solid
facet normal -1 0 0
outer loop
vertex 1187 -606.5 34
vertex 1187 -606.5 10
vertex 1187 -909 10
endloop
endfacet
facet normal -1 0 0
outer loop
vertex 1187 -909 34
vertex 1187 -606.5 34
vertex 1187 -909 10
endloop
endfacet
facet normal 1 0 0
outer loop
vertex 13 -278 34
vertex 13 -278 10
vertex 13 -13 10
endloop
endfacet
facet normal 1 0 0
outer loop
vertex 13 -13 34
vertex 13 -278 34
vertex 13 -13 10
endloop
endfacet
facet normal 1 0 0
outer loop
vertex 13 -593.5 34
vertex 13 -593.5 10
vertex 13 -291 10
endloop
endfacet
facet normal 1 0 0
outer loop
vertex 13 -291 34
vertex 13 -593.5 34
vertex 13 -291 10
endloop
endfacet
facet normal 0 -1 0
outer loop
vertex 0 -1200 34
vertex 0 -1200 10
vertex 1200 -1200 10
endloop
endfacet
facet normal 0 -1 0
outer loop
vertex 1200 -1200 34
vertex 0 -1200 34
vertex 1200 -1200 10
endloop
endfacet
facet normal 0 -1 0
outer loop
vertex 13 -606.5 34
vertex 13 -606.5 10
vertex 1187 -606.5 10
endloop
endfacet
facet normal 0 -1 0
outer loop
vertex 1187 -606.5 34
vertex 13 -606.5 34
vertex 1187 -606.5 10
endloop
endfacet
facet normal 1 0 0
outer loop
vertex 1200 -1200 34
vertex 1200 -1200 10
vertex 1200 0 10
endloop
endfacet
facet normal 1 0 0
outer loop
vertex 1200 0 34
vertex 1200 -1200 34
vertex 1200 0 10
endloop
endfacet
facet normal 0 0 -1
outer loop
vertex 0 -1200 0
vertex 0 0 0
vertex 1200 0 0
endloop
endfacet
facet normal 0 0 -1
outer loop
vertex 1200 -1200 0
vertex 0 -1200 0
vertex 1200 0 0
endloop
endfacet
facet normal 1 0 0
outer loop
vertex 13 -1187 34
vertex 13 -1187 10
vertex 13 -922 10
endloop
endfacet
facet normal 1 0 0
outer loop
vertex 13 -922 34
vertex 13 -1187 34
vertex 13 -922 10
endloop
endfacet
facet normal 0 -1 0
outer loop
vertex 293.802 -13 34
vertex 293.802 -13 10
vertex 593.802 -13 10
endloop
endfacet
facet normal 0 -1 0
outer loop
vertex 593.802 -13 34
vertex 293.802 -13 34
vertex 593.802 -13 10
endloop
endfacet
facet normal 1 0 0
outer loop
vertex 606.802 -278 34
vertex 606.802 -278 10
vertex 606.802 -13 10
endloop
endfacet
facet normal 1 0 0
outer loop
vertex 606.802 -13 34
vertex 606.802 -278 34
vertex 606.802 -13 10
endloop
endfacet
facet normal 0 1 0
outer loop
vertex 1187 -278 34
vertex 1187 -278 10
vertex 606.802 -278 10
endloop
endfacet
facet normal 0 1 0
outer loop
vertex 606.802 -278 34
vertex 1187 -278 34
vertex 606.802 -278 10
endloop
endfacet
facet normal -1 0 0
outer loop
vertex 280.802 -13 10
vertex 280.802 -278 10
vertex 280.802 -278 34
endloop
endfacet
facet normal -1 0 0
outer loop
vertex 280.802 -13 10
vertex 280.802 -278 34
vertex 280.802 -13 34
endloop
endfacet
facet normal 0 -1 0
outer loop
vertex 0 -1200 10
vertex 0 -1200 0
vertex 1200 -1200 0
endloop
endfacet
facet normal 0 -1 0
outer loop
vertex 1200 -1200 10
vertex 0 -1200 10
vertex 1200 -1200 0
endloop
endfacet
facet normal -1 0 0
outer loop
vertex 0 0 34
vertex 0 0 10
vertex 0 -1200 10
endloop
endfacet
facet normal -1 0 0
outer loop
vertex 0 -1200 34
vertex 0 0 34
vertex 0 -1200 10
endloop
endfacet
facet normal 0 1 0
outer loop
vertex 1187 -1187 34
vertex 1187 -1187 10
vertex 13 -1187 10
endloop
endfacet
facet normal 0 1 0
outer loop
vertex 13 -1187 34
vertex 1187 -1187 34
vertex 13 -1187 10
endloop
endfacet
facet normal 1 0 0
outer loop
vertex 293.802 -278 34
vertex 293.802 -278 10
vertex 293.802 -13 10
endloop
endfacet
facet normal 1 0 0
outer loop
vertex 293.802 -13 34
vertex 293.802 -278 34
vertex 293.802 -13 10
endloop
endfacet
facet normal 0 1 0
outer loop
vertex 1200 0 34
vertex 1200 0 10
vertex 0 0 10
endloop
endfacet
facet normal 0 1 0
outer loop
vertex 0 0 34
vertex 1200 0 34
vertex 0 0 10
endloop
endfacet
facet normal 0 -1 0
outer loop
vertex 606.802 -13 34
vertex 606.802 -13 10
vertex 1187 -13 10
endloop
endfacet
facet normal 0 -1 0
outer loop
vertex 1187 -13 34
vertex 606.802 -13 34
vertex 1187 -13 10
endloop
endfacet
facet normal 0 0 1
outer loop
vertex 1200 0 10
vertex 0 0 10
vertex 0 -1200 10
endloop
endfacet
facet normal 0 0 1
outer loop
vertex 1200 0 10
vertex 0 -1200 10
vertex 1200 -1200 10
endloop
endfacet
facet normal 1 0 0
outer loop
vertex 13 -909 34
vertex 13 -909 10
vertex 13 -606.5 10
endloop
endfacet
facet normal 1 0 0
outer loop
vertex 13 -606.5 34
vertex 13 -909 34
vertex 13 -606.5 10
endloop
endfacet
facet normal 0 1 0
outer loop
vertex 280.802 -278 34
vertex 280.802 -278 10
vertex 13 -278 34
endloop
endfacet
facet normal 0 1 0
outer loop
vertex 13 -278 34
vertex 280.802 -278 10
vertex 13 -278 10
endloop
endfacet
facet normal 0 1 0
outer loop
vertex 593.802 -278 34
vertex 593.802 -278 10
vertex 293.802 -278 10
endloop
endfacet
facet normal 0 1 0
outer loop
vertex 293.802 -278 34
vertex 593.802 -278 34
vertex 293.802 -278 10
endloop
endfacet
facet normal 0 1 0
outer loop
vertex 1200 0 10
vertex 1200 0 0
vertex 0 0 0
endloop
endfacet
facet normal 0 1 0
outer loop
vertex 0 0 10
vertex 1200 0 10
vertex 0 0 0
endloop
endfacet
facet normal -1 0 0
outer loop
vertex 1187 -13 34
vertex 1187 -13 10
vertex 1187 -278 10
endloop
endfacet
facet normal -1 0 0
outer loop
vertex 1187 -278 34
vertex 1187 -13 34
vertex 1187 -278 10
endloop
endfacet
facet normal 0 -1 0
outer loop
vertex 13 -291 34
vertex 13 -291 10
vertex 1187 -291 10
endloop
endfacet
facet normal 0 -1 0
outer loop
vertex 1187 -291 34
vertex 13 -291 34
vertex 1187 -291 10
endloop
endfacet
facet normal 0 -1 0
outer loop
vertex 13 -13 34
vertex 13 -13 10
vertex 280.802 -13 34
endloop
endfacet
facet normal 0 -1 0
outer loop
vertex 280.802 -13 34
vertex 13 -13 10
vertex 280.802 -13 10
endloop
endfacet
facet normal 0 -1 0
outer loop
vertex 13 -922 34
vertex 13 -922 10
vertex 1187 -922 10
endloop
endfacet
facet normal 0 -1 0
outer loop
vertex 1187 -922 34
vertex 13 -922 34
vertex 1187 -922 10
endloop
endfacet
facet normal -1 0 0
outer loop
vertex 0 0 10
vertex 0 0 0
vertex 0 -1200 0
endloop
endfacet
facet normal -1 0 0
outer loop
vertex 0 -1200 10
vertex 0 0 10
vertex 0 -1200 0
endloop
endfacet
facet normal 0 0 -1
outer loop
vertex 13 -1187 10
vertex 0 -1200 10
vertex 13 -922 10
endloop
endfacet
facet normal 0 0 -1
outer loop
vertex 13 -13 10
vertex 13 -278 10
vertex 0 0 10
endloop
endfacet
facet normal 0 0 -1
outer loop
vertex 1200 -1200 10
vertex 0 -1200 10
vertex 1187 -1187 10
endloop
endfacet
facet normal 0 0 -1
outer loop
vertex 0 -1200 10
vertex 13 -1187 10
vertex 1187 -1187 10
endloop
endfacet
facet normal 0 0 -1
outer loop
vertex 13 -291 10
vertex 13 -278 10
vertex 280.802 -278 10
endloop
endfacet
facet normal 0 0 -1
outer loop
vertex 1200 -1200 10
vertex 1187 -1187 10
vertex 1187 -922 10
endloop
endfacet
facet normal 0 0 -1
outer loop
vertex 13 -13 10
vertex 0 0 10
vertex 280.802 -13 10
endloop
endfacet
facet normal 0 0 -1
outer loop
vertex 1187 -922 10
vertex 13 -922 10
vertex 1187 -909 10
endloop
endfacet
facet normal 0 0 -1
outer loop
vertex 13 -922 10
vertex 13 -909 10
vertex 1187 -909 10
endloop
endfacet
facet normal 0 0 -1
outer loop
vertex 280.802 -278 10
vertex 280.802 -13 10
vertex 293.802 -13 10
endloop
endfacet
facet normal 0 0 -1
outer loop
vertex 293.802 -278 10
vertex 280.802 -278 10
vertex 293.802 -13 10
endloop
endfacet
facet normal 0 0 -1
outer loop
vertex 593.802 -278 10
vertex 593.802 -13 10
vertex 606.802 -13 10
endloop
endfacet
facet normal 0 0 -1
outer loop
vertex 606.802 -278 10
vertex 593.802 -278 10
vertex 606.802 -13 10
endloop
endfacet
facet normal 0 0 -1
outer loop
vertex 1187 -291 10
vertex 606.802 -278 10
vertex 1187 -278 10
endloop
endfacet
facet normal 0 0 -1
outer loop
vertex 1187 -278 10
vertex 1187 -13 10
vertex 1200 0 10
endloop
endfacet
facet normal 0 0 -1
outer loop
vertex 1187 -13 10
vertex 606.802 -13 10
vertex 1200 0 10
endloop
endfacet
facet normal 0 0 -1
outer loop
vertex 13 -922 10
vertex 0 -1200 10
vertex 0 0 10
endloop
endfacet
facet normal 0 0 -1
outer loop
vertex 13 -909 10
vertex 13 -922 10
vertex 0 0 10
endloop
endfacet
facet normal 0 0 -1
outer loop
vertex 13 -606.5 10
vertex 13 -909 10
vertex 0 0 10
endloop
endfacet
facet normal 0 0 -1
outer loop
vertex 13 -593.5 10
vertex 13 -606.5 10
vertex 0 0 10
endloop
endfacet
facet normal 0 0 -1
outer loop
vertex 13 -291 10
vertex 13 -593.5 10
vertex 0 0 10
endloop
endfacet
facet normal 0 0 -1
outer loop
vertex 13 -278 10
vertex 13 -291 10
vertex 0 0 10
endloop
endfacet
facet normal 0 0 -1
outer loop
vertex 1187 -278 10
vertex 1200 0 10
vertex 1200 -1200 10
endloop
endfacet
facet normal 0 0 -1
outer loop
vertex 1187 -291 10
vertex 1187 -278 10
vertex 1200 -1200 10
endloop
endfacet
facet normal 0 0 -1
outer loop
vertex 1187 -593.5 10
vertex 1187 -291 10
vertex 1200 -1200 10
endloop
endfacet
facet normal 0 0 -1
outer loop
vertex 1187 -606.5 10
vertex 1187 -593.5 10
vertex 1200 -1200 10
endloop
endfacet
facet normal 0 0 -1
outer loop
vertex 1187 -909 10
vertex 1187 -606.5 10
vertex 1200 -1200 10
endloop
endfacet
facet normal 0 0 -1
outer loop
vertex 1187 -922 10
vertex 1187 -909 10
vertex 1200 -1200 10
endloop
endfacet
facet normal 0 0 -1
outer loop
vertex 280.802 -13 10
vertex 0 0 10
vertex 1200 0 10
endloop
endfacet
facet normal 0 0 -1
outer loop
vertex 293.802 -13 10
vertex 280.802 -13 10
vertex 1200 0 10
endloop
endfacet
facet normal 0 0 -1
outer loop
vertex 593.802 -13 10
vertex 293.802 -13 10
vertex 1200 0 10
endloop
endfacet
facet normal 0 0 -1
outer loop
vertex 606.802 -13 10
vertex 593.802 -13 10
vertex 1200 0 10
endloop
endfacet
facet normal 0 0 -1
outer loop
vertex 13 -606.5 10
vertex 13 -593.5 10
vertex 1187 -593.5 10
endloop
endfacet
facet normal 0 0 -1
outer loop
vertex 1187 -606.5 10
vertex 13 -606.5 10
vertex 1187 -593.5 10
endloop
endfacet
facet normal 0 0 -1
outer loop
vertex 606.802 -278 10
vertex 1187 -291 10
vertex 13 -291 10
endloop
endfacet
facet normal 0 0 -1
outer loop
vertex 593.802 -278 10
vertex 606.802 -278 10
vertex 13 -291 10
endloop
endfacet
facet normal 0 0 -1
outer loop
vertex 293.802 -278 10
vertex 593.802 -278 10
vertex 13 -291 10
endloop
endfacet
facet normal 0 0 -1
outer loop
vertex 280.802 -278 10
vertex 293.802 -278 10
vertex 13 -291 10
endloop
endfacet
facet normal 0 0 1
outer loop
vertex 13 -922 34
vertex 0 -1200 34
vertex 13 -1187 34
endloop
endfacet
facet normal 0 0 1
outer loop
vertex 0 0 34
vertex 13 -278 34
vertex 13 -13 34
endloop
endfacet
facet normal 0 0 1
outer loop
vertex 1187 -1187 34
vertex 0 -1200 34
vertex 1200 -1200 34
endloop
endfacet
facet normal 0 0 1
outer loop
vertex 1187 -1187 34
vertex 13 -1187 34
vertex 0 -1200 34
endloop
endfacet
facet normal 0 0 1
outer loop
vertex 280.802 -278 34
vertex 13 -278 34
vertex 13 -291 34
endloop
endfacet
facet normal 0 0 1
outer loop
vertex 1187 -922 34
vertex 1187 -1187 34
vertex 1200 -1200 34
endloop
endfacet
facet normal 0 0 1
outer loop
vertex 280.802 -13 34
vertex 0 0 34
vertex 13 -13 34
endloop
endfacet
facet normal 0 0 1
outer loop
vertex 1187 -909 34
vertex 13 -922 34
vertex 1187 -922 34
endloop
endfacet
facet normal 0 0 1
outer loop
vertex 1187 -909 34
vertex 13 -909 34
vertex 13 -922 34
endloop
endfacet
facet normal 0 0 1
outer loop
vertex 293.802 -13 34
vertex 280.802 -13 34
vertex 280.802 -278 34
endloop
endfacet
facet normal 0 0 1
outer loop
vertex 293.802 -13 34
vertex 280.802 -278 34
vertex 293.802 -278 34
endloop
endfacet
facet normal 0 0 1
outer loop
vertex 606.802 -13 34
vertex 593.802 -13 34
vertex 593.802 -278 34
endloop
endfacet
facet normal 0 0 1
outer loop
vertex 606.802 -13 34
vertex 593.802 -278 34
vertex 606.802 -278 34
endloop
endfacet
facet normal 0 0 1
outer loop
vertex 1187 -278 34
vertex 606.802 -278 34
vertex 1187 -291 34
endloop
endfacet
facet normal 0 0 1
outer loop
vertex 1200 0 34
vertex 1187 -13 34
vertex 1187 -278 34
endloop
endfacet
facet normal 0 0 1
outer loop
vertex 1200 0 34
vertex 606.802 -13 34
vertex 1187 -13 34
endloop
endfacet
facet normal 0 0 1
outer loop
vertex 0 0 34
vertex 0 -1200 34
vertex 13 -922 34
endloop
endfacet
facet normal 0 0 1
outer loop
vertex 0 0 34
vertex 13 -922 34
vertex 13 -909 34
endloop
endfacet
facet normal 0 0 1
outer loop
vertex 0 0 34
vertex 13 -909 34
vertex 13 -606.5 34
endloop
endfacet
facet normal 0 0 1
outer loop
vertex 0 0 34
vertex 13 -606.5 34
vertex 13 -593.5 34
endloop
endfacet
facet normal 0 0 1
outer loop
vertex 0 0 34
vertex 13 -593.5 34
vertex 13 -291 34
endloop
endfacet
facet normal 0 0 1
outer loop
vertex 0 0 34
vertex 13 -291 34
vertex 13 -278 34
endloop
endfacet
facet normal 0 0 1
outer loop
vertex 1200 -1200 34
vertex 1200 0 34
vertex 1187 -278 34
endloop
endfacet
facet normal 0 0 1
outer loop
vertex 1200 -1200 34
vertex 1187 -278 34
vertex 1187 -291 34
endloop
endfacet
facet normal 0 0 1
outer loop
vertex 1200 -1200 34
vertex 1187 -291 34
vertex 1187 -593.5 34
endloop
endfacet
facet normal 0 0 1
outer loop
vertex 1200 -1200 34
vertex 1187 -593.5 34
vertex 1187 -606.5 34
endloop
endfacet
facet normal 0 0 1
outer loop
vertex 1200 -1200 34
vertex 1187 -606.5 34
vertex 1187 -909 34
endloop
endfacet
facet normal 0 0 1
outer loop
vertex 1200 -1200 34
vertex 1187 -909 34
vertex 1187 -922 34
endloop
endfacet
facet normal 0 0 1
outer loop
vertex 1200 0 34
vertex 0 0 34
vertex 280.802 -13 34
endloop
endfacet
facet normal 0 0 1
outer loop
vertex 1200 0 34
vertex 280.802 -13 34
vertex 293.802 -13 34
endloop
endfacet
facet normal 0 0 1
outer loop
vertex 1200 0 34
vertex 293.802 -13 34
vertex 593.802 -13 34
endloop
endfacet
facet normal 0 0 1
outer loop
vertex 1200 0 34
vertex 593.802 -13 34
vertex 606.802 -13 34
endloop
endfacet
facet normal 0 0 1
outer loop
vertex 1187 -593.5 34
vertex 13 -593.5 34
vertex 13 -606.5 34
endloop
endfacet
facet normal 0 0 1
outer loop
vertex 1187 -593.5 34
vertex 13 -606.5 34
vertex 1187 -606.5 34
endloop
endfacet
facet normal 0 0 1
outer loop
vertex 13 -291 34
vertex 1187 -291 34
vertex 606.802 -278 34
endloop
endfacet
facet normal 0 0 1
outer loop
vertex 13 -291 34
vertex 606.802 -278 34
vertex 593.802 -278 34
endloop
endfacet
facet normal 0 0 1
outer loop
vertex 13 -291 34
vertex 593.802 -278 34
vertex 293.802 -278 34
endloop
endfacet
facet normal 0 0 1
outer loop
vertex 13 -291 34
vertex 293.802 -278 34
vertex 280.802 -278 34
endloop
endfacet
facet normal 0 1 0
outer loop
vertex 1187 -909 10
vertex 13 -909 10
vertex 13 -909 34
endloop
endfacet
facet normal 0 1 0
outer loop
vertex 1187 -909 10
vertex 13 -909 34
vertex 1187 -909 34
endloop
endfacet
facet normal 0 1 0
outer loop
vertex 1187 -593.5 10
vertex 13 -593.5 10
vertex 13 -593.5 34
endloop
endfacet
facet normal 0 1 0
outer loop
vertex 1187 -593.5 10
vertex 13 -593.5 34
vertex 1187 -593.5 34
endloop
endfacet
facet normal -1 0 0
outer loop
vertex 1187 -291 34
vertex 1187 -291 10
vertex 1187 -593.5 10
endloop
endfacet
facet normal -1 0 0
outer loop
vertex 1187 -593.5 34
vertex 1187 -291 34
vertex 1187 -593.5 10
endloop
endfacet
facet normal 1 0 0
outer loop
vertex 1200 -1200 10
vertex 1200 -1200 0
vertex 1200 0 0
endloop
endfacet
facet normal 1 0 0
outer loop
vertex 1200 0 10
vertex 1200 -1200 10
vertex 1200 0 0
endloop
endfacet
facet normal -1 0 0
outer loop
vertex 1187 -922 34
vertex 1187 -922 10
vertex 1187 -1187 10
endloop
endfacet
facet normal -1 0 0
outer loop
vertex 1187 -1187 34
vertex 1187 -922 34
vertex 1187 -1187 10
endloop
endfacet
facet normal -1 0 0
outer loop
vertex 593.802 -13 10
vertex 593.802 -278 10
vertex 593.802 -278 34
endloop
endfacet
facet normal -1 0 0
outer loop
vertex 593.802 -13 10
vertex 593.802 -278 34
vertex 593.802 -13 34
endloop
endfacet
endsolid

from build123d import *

# Parameters (mm, degrees)
F0_W     = 1174
F0_H     = 265
F0_H_2   = 302.5
F0_W_2   = 267.8023775816
F0_W_3   = 300
F0_W_4   = 580.1976224184
F0_W_5   = 13
F0_H_3   = 13
F1_DEPTH = 10
F2_START = 10
F2_DEPTH = 24


with BuildPart() as f1:
    # F0 (on Top) → F1 (new body)
    with BuildSketch(Plane.XY):
        Polygon((13, 0), (0, 0), (0, -1200), (13, -1200), (13, -1187), (13, -922), (13, -909), (13, -606.5), (13, -593.5), (13, -291), (13, -278), (13, -13), align=None)
        Polygon((1187, 0), (13, 0), (13, -13), (280.8023775816, -13), (293.8023775816, -13), (593.8023775816, -13), (606.8023775816, -13), (1187, -13), align=None)
        Polygon((1200, 0), (1187, 0), (1187, -13), (1187, -278), (1187, -291), (1187, -593.5), (1187, -606.5), (1187, -909), (1187, -922), (1187, -1187), (1200, -1187), align=None)
        Polygon((13, -1187), (13, -1200), (1200, -1200), (1200, -1187), (1187, -1187), align=None)
        with Locations((600, -1054.5)):
            Rectangle(F0_W, F0_H)
        with Locations((600, -757.75)):
            Rectangle(F0_W, F0_H_2)
        with Locations((600, -442.25)):
            Rectangle(F0_W, F0_H_2)
        with Locations((146.9011887908, -145.5)):
            Rectangle(F0_W_2, F0_H)
        with Locations((443.8023775816, -145.5)):
            Rectangle(F0_W_3, F0_H)
        with Locations((896.9011887908, -145.5)):
            Rectangle(F0_W_4, F0_H)
        with Locations((287.3023775816, -145.5)):
            Rectangle(F0_W_5, F0_H)
        Polygon((280.8023775816, -278), (13, -278), (13, -291), (1187, -291), (1187, -278), (606.8023775816, -278), (593.8023775816, -278), (293.8023775816, -278), align=None)
        with Locations((600.3023775816, -145.5)):
            Rectangle(F0_W_5, F0_H)
        with Locations((600, -600)):
            Rectangle(F0_W, F0_H_3)
        with Locations((600, -915.5)):
            Rectangle(F0_W, F0_H_3)
    extrude(amount=F1_DEPTH)


with BuildPart() as f2:
    # F0 (on Top) → F2 (new body)
    with BuildSketch(Plane.XY.offset(F2_START)):
        Polygon((13, 0), (0, 0), (0, -1200), (13, -1200), (13, -1187), (13, -922), (13, -909), (13, -606.5), (13, -593.5), (13, -291), (13, -278), (13, -13), align=None)
        with Locations((600, -915.5)):
            Rectangle(F0_W, F0_H_3)
        Polygon((13, -1187), (13, -1200), (1200, -1200), (1200, -1187), (1187, -1187), align=None)
        Polygon((1200, 0), (1187, 0), (1187, -13), (1187, -278), (1187, -291), (1187, -593.5), (1187, -606.5), (1187, -909), (1187, -922), (1187, -1187), (1200, -1187), align=None)
        with Locations((600, -600)):
            Rectangle(F0_W, F0_H_3)
        Polygon((280.8023775816, -278), (13, -278), (13, -291), (1187, -291), (1187, -278), (606.8023775816, -278), (593.8023775816, -278), (293.8023775816, -278), align=None)
        with Locations((600.3023775816, -145.5)):
            Rectangle(F0_W_5, F0_H)
        with Locations((287.3023775816, -145.5)):
            Rectangle(F0_W_5, F0_H)
        Polygon((1187, 0), (13, 0), (13, -13), (280.8023775816, -13), (293.8023775816, -13), (593.8023775816, -13), (606.8023775816, -13), (1187, -13), align=None)
    extrude(amount=F2_DEPTH)


solid = Compound([f1.part, f2.part])
